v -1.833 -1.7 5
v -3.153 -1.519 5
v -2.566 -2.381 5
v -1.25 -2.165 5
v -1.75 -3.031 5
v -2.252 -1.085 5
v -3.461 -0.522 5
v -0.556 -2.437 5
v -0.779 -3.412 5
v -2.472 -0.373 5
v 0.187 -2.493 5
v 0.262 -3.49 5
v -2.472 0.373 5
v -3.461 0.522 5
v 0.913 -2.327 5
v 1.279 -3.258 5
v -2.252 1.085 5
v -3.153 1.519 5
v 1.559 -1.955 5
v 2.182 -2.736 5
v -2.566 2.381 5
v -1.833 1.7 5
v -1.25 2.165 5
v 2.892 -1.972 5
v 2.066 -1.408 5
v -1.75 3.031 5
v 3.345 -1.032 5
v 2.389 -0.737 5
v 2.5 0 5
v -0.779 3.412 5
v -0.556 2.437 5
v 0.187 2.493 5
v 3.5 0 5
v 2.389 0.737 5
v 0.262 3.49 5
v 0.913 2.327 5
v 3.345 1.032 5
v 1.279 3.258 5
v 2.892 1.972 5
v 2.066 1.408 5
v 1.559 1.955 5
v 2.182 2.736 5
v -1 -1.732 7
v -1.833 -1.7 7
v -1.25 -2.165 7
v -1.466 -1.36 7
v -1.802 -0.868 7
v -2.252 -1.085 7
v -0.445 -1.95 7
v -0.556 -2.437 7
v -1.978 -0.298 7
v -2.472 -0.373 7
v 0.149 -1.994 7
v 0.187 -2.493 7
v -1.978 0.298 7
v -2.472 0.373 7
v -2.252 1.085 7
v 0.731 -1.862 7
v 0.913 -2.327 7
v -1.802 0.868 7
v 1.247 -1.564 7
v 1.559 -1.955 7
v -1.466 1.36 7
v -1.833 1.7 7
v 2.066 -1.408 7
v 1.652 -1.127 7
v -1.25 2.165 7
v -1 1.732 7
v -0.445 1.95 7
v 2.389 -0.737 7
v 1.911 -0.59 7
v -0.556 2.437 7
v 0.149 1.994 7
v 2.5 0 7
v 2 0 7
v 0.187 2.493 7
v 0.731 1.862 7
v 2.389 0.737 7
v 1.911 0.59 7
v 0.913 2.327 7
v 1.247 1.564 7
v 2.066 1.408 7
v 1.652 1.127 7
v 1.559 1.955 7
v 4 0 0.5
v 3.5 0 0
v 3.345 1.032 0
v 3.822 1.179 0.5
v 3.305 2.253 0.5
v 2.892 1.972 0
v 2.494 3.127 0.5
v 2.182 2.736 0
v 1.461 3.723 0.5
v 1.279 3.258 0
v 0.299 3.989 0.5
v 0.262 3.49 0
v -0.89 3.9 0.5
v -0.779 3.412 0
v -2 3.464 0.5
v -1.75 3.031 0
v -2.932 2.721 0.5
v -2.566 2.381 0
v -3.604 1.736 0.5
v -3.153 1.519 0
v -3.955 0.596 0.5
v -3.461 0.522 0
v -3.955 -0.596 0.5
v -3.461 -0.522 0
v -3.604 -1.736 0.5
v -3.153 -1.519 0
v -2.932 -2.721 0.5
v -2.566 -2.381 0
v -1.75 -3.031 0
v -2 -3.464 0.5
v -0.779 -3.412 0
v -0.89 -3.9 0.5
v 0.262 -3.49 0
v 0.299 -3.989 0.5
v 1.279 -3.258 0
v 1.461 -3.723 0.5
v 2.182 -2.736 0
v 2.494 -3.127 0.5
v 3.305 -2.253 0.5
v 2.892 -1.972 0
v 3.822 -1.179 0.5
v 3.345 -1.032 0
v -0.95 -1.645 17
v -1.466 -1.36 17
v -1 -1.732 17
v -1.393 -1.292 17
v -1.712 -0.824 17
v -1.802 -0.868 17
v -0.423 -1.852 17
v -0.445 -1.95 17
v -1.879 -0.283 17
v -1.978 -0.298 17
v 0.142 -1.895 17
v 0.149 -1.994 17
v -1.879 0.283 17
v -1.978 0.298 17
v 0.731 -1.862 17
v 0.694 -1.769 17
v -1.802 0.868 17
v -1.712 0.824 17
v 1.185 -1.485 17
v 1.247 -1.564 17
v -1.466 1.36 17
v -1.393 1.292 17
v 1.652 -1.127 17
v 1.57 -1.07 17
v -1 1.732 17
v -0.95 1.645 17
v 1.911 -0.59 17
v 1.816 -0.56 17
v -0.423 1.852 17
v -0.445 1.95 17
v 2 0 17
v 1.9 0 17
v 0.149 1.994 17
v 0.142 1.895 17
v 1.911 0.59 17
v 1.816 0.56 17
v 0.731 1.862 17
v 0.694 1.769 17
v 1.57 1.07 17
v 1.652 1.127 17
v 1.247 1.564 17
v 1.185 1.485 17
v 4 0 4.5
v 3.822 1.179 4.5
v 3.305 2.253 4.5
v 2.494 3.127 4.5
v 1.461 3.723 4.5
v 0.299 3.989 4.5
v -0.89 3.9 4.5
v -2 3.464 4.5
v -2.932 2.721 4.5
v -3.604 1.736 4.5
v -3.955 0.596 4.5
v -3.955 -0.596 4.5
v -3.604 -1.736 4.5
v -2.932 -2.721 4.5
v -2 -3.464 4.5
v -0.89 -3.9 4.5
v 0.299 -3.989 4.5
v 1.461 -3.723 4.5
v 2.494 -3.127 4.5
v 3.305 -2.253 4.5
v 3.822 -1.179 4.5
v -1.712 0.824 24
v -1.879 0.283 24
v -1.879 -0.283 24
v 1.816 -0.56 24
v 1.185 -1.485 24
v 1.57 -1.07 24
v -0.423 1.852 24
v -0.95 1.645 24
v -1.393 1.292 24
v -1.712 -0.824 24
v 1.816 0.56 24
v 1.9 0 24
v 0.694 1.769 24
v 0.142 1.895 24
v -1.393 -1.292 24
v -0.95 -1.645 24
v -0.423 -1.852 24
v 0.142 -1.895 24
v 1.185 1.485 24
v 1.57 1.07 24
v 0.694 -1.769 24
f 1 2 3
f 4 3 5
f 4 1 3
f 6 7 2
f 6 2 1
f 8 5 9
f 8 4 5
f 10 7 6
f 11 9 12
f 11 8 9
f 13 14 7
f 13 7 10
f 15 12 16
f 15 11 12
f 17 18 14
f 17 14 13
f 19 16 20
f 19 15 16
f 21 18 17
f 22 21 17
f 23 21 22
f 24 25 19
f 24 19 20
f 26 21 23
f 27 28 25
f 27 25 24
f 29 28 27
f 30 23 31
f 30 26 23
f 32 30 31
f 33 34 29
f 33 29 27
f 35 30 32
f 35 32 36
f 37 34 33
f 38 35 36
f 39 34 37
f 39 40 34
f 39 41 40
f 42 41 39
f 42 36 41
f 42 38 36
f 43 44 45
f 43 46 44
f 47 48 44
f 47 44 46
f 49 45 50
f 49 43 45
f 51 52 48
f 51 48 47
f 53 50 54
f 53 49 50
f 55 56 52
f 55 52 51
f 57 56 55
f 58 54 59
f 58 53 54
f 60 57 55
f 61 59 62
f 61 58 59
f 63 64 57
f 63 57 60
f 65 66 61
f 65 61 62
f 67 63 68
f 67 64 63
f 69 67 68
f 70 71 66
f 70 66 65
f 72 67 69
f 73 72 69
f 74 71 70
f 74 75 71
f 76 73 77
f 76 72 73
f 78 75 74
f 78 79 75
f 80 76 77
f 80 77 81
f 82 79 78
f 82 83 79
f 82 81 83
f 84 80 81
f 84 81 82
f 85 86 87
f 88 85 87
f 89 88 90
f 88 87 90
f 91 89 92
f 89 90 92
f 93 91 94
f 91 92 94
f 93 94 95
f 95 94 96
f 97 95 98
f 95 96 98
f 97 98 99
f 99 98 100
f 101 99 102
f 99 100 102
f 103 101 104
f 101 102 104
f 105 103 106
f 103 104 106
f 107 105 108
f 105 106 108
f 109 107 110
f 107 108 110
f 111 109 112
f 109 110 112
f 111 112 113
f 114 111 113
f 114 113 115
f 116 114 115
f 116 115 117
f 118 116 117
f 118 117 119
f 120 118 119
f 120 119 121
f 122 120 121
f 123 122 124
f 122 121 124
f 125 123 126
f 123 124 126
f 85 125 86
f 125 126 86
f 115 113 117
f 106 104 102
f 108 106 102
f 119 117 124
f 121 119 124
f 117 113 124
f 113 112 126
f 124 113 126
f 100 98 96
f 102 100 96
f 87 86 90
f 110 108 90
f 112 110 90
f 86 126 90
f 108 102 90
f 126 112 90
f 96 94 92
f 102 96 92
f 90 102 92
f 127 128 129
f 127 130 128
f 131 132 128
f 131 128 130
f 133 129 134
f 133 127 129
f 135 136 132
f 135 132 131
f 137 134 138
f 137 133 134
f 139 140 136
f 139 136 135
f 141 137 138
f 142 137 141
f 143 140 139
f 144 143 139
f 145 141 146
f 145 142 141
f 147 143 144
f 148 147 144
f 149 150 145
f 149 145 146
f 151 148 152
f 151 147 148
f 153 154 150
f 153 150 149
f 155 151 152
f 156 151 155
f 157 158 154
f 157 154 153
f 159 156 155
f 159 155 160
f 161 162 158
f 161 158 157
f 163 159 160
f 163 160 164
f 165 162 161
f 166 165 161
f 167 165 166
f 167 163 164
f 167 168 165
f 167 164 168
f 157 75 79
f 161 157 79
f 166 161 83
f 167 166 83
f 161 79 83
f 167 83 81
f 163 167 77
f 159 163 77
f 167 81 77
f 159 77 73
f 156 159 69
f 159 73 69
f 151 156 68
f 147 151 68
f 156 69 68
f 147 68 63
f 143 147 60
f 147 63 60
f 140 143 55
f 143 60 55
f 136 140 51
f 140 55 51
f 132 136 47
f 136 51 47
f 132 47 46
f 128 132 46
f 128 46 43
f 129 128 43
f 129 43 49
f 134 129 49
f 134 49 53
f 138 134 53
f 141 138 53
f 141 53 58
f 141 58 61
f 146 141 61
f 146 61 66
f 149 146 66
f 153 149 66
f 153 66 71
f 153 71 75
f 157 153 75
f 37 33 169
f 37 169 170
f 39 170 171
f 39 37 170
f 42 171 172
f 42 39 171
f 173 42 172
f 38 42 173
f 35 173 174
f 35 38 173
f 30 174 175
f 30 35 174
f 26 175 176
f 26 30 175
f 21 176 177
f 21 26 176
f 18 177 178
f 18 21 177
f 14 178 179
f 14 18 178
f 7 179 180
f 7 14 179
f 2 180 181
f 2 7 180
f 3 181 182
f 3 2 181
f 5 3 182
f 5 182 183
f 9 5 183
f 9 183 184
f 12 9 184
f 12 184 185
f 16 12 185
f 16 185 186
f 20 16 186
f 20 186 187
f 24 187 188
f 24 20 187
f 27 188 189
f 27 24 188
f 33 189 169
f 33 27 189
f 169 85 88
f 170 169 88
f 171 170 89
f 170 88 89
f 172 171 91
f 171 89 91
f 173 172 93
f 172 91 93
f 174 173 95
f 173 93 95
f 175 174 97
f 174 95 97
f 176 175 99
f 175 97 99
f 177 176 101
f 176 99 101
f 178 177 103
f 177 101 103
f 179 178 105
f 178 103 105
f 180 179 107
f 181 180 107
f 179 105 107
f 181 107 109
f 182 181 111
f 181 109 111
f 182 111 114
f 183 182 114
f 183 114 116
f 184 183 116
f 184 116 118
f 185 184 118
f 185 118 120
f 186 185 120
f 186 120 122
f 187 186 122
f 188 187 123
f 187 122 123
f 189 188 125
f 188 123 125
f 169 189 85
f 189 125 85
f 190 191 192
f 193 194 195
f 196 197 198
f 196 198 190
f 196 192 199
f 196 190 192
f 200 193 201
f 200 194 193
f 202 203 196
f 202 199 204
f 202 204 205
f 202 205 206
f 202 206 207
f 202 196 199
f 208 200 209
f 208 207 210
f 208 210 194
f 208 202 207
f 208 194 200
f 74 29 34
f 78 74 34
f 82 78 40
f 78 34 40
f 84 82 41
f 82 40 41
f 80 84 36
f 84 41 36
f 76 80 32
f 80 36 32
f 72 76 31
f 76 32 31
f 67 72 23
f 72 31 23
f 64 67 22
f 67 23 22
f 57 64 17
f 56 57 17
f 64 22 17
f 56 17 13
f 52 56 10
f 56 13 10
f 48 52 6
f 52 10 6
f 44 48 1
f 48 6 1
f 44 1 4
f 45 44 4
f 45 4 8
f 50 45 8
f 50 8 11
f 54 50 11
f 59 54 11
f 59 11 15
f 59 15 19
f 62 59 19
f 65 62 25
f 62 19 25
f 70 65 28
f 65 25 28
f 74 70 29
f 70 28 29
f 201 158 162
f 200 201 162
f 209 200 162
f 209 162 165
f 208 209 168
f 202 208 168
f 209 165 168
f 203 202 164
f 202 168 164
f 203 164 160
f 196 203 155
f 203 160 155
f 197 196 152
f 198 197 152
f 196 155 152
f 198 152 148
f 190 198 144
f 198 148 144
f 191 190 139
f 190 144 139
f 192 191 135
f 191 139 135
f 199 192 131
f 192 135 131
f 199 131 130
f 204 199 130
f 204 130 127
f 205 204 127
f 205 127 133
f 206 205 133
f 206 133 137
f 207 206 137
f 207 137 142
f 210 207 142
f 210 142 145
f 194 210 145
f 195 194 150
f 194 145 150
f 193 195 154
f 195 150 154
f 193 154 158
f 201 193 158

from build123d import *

# Parameters (mm, degrees)
SKETCH_1_R          = 4
EXTRUDE_1_DEPTH     = 5
SKETCH_2_R          = 2.5
EXTRUDE_2_DEPTH     = 2
SKETCH_3_R          = 2
EXTRUDE_3_DEPTH     = 17
CHAMFER_1_SIZE      = 0.5
CHAMFER_2_SIZE      = 0.5
CUT_EXTRUDE_START   = -7
SKETCH_4_R          = 2
SKETCH_4_R_2        = 1.9
CUT_EXTRUDE_1_DEPTH = 7


with BuildPart() as part:
    # 草图1 → 凸台-拉伸1 (new body)
    with BuildSketch(Plane.XY):
        Circle(SKETCH_1_R)
    extrude(amount=EXTRUDE_1_DEPTH)

    # 草图2 → 凸台-拉伸2 (add)
    with BuildSketch(Plane.XY.offset(5)):
        Circle(SKETCH_2_R)
    extrude(amount=EXTRUDE_2_DEPTH)

    # 草图3 → 凸台-拉伸3 (add)
    with BuildSketch(Plane.XY.offset(7)):
        Circle(SKETCH_3_R)
    extrude(amount=EXTRUDE_3_DEPTH)

    # 倒角1
    chamfer_1_edges = [part.edges().sort_by_distance(p)[0] for p in [
        (-4, 0, 0),
    ]]
    chamfer(chamfer_1_edges, length=CHAMFER_1_SIZE)

    # 倒角2
    chamfer_2_edges = [part.edges().sort_by_distance(p)[0] for p in [
        (-4, 0, 5),
    ]]
    chamfer(chamfer_2_edges, length=CHAMFER_2_SIZE)

    # 草图4 → 切除-拉伸1 (cut)
    with BuildSketch(Plane.XY.offset(24).offset(CUT_EXTRUDE_START)):
        Circle(SKETCH_4_R)
        Circle(SKETCH_4_R_2, mode=Mode.SUBTRACT)
    extrude(amount=CUT_EXTRUDE_1_DEPTH, mode=Mode.SUBTRACT)


solid = part.part
